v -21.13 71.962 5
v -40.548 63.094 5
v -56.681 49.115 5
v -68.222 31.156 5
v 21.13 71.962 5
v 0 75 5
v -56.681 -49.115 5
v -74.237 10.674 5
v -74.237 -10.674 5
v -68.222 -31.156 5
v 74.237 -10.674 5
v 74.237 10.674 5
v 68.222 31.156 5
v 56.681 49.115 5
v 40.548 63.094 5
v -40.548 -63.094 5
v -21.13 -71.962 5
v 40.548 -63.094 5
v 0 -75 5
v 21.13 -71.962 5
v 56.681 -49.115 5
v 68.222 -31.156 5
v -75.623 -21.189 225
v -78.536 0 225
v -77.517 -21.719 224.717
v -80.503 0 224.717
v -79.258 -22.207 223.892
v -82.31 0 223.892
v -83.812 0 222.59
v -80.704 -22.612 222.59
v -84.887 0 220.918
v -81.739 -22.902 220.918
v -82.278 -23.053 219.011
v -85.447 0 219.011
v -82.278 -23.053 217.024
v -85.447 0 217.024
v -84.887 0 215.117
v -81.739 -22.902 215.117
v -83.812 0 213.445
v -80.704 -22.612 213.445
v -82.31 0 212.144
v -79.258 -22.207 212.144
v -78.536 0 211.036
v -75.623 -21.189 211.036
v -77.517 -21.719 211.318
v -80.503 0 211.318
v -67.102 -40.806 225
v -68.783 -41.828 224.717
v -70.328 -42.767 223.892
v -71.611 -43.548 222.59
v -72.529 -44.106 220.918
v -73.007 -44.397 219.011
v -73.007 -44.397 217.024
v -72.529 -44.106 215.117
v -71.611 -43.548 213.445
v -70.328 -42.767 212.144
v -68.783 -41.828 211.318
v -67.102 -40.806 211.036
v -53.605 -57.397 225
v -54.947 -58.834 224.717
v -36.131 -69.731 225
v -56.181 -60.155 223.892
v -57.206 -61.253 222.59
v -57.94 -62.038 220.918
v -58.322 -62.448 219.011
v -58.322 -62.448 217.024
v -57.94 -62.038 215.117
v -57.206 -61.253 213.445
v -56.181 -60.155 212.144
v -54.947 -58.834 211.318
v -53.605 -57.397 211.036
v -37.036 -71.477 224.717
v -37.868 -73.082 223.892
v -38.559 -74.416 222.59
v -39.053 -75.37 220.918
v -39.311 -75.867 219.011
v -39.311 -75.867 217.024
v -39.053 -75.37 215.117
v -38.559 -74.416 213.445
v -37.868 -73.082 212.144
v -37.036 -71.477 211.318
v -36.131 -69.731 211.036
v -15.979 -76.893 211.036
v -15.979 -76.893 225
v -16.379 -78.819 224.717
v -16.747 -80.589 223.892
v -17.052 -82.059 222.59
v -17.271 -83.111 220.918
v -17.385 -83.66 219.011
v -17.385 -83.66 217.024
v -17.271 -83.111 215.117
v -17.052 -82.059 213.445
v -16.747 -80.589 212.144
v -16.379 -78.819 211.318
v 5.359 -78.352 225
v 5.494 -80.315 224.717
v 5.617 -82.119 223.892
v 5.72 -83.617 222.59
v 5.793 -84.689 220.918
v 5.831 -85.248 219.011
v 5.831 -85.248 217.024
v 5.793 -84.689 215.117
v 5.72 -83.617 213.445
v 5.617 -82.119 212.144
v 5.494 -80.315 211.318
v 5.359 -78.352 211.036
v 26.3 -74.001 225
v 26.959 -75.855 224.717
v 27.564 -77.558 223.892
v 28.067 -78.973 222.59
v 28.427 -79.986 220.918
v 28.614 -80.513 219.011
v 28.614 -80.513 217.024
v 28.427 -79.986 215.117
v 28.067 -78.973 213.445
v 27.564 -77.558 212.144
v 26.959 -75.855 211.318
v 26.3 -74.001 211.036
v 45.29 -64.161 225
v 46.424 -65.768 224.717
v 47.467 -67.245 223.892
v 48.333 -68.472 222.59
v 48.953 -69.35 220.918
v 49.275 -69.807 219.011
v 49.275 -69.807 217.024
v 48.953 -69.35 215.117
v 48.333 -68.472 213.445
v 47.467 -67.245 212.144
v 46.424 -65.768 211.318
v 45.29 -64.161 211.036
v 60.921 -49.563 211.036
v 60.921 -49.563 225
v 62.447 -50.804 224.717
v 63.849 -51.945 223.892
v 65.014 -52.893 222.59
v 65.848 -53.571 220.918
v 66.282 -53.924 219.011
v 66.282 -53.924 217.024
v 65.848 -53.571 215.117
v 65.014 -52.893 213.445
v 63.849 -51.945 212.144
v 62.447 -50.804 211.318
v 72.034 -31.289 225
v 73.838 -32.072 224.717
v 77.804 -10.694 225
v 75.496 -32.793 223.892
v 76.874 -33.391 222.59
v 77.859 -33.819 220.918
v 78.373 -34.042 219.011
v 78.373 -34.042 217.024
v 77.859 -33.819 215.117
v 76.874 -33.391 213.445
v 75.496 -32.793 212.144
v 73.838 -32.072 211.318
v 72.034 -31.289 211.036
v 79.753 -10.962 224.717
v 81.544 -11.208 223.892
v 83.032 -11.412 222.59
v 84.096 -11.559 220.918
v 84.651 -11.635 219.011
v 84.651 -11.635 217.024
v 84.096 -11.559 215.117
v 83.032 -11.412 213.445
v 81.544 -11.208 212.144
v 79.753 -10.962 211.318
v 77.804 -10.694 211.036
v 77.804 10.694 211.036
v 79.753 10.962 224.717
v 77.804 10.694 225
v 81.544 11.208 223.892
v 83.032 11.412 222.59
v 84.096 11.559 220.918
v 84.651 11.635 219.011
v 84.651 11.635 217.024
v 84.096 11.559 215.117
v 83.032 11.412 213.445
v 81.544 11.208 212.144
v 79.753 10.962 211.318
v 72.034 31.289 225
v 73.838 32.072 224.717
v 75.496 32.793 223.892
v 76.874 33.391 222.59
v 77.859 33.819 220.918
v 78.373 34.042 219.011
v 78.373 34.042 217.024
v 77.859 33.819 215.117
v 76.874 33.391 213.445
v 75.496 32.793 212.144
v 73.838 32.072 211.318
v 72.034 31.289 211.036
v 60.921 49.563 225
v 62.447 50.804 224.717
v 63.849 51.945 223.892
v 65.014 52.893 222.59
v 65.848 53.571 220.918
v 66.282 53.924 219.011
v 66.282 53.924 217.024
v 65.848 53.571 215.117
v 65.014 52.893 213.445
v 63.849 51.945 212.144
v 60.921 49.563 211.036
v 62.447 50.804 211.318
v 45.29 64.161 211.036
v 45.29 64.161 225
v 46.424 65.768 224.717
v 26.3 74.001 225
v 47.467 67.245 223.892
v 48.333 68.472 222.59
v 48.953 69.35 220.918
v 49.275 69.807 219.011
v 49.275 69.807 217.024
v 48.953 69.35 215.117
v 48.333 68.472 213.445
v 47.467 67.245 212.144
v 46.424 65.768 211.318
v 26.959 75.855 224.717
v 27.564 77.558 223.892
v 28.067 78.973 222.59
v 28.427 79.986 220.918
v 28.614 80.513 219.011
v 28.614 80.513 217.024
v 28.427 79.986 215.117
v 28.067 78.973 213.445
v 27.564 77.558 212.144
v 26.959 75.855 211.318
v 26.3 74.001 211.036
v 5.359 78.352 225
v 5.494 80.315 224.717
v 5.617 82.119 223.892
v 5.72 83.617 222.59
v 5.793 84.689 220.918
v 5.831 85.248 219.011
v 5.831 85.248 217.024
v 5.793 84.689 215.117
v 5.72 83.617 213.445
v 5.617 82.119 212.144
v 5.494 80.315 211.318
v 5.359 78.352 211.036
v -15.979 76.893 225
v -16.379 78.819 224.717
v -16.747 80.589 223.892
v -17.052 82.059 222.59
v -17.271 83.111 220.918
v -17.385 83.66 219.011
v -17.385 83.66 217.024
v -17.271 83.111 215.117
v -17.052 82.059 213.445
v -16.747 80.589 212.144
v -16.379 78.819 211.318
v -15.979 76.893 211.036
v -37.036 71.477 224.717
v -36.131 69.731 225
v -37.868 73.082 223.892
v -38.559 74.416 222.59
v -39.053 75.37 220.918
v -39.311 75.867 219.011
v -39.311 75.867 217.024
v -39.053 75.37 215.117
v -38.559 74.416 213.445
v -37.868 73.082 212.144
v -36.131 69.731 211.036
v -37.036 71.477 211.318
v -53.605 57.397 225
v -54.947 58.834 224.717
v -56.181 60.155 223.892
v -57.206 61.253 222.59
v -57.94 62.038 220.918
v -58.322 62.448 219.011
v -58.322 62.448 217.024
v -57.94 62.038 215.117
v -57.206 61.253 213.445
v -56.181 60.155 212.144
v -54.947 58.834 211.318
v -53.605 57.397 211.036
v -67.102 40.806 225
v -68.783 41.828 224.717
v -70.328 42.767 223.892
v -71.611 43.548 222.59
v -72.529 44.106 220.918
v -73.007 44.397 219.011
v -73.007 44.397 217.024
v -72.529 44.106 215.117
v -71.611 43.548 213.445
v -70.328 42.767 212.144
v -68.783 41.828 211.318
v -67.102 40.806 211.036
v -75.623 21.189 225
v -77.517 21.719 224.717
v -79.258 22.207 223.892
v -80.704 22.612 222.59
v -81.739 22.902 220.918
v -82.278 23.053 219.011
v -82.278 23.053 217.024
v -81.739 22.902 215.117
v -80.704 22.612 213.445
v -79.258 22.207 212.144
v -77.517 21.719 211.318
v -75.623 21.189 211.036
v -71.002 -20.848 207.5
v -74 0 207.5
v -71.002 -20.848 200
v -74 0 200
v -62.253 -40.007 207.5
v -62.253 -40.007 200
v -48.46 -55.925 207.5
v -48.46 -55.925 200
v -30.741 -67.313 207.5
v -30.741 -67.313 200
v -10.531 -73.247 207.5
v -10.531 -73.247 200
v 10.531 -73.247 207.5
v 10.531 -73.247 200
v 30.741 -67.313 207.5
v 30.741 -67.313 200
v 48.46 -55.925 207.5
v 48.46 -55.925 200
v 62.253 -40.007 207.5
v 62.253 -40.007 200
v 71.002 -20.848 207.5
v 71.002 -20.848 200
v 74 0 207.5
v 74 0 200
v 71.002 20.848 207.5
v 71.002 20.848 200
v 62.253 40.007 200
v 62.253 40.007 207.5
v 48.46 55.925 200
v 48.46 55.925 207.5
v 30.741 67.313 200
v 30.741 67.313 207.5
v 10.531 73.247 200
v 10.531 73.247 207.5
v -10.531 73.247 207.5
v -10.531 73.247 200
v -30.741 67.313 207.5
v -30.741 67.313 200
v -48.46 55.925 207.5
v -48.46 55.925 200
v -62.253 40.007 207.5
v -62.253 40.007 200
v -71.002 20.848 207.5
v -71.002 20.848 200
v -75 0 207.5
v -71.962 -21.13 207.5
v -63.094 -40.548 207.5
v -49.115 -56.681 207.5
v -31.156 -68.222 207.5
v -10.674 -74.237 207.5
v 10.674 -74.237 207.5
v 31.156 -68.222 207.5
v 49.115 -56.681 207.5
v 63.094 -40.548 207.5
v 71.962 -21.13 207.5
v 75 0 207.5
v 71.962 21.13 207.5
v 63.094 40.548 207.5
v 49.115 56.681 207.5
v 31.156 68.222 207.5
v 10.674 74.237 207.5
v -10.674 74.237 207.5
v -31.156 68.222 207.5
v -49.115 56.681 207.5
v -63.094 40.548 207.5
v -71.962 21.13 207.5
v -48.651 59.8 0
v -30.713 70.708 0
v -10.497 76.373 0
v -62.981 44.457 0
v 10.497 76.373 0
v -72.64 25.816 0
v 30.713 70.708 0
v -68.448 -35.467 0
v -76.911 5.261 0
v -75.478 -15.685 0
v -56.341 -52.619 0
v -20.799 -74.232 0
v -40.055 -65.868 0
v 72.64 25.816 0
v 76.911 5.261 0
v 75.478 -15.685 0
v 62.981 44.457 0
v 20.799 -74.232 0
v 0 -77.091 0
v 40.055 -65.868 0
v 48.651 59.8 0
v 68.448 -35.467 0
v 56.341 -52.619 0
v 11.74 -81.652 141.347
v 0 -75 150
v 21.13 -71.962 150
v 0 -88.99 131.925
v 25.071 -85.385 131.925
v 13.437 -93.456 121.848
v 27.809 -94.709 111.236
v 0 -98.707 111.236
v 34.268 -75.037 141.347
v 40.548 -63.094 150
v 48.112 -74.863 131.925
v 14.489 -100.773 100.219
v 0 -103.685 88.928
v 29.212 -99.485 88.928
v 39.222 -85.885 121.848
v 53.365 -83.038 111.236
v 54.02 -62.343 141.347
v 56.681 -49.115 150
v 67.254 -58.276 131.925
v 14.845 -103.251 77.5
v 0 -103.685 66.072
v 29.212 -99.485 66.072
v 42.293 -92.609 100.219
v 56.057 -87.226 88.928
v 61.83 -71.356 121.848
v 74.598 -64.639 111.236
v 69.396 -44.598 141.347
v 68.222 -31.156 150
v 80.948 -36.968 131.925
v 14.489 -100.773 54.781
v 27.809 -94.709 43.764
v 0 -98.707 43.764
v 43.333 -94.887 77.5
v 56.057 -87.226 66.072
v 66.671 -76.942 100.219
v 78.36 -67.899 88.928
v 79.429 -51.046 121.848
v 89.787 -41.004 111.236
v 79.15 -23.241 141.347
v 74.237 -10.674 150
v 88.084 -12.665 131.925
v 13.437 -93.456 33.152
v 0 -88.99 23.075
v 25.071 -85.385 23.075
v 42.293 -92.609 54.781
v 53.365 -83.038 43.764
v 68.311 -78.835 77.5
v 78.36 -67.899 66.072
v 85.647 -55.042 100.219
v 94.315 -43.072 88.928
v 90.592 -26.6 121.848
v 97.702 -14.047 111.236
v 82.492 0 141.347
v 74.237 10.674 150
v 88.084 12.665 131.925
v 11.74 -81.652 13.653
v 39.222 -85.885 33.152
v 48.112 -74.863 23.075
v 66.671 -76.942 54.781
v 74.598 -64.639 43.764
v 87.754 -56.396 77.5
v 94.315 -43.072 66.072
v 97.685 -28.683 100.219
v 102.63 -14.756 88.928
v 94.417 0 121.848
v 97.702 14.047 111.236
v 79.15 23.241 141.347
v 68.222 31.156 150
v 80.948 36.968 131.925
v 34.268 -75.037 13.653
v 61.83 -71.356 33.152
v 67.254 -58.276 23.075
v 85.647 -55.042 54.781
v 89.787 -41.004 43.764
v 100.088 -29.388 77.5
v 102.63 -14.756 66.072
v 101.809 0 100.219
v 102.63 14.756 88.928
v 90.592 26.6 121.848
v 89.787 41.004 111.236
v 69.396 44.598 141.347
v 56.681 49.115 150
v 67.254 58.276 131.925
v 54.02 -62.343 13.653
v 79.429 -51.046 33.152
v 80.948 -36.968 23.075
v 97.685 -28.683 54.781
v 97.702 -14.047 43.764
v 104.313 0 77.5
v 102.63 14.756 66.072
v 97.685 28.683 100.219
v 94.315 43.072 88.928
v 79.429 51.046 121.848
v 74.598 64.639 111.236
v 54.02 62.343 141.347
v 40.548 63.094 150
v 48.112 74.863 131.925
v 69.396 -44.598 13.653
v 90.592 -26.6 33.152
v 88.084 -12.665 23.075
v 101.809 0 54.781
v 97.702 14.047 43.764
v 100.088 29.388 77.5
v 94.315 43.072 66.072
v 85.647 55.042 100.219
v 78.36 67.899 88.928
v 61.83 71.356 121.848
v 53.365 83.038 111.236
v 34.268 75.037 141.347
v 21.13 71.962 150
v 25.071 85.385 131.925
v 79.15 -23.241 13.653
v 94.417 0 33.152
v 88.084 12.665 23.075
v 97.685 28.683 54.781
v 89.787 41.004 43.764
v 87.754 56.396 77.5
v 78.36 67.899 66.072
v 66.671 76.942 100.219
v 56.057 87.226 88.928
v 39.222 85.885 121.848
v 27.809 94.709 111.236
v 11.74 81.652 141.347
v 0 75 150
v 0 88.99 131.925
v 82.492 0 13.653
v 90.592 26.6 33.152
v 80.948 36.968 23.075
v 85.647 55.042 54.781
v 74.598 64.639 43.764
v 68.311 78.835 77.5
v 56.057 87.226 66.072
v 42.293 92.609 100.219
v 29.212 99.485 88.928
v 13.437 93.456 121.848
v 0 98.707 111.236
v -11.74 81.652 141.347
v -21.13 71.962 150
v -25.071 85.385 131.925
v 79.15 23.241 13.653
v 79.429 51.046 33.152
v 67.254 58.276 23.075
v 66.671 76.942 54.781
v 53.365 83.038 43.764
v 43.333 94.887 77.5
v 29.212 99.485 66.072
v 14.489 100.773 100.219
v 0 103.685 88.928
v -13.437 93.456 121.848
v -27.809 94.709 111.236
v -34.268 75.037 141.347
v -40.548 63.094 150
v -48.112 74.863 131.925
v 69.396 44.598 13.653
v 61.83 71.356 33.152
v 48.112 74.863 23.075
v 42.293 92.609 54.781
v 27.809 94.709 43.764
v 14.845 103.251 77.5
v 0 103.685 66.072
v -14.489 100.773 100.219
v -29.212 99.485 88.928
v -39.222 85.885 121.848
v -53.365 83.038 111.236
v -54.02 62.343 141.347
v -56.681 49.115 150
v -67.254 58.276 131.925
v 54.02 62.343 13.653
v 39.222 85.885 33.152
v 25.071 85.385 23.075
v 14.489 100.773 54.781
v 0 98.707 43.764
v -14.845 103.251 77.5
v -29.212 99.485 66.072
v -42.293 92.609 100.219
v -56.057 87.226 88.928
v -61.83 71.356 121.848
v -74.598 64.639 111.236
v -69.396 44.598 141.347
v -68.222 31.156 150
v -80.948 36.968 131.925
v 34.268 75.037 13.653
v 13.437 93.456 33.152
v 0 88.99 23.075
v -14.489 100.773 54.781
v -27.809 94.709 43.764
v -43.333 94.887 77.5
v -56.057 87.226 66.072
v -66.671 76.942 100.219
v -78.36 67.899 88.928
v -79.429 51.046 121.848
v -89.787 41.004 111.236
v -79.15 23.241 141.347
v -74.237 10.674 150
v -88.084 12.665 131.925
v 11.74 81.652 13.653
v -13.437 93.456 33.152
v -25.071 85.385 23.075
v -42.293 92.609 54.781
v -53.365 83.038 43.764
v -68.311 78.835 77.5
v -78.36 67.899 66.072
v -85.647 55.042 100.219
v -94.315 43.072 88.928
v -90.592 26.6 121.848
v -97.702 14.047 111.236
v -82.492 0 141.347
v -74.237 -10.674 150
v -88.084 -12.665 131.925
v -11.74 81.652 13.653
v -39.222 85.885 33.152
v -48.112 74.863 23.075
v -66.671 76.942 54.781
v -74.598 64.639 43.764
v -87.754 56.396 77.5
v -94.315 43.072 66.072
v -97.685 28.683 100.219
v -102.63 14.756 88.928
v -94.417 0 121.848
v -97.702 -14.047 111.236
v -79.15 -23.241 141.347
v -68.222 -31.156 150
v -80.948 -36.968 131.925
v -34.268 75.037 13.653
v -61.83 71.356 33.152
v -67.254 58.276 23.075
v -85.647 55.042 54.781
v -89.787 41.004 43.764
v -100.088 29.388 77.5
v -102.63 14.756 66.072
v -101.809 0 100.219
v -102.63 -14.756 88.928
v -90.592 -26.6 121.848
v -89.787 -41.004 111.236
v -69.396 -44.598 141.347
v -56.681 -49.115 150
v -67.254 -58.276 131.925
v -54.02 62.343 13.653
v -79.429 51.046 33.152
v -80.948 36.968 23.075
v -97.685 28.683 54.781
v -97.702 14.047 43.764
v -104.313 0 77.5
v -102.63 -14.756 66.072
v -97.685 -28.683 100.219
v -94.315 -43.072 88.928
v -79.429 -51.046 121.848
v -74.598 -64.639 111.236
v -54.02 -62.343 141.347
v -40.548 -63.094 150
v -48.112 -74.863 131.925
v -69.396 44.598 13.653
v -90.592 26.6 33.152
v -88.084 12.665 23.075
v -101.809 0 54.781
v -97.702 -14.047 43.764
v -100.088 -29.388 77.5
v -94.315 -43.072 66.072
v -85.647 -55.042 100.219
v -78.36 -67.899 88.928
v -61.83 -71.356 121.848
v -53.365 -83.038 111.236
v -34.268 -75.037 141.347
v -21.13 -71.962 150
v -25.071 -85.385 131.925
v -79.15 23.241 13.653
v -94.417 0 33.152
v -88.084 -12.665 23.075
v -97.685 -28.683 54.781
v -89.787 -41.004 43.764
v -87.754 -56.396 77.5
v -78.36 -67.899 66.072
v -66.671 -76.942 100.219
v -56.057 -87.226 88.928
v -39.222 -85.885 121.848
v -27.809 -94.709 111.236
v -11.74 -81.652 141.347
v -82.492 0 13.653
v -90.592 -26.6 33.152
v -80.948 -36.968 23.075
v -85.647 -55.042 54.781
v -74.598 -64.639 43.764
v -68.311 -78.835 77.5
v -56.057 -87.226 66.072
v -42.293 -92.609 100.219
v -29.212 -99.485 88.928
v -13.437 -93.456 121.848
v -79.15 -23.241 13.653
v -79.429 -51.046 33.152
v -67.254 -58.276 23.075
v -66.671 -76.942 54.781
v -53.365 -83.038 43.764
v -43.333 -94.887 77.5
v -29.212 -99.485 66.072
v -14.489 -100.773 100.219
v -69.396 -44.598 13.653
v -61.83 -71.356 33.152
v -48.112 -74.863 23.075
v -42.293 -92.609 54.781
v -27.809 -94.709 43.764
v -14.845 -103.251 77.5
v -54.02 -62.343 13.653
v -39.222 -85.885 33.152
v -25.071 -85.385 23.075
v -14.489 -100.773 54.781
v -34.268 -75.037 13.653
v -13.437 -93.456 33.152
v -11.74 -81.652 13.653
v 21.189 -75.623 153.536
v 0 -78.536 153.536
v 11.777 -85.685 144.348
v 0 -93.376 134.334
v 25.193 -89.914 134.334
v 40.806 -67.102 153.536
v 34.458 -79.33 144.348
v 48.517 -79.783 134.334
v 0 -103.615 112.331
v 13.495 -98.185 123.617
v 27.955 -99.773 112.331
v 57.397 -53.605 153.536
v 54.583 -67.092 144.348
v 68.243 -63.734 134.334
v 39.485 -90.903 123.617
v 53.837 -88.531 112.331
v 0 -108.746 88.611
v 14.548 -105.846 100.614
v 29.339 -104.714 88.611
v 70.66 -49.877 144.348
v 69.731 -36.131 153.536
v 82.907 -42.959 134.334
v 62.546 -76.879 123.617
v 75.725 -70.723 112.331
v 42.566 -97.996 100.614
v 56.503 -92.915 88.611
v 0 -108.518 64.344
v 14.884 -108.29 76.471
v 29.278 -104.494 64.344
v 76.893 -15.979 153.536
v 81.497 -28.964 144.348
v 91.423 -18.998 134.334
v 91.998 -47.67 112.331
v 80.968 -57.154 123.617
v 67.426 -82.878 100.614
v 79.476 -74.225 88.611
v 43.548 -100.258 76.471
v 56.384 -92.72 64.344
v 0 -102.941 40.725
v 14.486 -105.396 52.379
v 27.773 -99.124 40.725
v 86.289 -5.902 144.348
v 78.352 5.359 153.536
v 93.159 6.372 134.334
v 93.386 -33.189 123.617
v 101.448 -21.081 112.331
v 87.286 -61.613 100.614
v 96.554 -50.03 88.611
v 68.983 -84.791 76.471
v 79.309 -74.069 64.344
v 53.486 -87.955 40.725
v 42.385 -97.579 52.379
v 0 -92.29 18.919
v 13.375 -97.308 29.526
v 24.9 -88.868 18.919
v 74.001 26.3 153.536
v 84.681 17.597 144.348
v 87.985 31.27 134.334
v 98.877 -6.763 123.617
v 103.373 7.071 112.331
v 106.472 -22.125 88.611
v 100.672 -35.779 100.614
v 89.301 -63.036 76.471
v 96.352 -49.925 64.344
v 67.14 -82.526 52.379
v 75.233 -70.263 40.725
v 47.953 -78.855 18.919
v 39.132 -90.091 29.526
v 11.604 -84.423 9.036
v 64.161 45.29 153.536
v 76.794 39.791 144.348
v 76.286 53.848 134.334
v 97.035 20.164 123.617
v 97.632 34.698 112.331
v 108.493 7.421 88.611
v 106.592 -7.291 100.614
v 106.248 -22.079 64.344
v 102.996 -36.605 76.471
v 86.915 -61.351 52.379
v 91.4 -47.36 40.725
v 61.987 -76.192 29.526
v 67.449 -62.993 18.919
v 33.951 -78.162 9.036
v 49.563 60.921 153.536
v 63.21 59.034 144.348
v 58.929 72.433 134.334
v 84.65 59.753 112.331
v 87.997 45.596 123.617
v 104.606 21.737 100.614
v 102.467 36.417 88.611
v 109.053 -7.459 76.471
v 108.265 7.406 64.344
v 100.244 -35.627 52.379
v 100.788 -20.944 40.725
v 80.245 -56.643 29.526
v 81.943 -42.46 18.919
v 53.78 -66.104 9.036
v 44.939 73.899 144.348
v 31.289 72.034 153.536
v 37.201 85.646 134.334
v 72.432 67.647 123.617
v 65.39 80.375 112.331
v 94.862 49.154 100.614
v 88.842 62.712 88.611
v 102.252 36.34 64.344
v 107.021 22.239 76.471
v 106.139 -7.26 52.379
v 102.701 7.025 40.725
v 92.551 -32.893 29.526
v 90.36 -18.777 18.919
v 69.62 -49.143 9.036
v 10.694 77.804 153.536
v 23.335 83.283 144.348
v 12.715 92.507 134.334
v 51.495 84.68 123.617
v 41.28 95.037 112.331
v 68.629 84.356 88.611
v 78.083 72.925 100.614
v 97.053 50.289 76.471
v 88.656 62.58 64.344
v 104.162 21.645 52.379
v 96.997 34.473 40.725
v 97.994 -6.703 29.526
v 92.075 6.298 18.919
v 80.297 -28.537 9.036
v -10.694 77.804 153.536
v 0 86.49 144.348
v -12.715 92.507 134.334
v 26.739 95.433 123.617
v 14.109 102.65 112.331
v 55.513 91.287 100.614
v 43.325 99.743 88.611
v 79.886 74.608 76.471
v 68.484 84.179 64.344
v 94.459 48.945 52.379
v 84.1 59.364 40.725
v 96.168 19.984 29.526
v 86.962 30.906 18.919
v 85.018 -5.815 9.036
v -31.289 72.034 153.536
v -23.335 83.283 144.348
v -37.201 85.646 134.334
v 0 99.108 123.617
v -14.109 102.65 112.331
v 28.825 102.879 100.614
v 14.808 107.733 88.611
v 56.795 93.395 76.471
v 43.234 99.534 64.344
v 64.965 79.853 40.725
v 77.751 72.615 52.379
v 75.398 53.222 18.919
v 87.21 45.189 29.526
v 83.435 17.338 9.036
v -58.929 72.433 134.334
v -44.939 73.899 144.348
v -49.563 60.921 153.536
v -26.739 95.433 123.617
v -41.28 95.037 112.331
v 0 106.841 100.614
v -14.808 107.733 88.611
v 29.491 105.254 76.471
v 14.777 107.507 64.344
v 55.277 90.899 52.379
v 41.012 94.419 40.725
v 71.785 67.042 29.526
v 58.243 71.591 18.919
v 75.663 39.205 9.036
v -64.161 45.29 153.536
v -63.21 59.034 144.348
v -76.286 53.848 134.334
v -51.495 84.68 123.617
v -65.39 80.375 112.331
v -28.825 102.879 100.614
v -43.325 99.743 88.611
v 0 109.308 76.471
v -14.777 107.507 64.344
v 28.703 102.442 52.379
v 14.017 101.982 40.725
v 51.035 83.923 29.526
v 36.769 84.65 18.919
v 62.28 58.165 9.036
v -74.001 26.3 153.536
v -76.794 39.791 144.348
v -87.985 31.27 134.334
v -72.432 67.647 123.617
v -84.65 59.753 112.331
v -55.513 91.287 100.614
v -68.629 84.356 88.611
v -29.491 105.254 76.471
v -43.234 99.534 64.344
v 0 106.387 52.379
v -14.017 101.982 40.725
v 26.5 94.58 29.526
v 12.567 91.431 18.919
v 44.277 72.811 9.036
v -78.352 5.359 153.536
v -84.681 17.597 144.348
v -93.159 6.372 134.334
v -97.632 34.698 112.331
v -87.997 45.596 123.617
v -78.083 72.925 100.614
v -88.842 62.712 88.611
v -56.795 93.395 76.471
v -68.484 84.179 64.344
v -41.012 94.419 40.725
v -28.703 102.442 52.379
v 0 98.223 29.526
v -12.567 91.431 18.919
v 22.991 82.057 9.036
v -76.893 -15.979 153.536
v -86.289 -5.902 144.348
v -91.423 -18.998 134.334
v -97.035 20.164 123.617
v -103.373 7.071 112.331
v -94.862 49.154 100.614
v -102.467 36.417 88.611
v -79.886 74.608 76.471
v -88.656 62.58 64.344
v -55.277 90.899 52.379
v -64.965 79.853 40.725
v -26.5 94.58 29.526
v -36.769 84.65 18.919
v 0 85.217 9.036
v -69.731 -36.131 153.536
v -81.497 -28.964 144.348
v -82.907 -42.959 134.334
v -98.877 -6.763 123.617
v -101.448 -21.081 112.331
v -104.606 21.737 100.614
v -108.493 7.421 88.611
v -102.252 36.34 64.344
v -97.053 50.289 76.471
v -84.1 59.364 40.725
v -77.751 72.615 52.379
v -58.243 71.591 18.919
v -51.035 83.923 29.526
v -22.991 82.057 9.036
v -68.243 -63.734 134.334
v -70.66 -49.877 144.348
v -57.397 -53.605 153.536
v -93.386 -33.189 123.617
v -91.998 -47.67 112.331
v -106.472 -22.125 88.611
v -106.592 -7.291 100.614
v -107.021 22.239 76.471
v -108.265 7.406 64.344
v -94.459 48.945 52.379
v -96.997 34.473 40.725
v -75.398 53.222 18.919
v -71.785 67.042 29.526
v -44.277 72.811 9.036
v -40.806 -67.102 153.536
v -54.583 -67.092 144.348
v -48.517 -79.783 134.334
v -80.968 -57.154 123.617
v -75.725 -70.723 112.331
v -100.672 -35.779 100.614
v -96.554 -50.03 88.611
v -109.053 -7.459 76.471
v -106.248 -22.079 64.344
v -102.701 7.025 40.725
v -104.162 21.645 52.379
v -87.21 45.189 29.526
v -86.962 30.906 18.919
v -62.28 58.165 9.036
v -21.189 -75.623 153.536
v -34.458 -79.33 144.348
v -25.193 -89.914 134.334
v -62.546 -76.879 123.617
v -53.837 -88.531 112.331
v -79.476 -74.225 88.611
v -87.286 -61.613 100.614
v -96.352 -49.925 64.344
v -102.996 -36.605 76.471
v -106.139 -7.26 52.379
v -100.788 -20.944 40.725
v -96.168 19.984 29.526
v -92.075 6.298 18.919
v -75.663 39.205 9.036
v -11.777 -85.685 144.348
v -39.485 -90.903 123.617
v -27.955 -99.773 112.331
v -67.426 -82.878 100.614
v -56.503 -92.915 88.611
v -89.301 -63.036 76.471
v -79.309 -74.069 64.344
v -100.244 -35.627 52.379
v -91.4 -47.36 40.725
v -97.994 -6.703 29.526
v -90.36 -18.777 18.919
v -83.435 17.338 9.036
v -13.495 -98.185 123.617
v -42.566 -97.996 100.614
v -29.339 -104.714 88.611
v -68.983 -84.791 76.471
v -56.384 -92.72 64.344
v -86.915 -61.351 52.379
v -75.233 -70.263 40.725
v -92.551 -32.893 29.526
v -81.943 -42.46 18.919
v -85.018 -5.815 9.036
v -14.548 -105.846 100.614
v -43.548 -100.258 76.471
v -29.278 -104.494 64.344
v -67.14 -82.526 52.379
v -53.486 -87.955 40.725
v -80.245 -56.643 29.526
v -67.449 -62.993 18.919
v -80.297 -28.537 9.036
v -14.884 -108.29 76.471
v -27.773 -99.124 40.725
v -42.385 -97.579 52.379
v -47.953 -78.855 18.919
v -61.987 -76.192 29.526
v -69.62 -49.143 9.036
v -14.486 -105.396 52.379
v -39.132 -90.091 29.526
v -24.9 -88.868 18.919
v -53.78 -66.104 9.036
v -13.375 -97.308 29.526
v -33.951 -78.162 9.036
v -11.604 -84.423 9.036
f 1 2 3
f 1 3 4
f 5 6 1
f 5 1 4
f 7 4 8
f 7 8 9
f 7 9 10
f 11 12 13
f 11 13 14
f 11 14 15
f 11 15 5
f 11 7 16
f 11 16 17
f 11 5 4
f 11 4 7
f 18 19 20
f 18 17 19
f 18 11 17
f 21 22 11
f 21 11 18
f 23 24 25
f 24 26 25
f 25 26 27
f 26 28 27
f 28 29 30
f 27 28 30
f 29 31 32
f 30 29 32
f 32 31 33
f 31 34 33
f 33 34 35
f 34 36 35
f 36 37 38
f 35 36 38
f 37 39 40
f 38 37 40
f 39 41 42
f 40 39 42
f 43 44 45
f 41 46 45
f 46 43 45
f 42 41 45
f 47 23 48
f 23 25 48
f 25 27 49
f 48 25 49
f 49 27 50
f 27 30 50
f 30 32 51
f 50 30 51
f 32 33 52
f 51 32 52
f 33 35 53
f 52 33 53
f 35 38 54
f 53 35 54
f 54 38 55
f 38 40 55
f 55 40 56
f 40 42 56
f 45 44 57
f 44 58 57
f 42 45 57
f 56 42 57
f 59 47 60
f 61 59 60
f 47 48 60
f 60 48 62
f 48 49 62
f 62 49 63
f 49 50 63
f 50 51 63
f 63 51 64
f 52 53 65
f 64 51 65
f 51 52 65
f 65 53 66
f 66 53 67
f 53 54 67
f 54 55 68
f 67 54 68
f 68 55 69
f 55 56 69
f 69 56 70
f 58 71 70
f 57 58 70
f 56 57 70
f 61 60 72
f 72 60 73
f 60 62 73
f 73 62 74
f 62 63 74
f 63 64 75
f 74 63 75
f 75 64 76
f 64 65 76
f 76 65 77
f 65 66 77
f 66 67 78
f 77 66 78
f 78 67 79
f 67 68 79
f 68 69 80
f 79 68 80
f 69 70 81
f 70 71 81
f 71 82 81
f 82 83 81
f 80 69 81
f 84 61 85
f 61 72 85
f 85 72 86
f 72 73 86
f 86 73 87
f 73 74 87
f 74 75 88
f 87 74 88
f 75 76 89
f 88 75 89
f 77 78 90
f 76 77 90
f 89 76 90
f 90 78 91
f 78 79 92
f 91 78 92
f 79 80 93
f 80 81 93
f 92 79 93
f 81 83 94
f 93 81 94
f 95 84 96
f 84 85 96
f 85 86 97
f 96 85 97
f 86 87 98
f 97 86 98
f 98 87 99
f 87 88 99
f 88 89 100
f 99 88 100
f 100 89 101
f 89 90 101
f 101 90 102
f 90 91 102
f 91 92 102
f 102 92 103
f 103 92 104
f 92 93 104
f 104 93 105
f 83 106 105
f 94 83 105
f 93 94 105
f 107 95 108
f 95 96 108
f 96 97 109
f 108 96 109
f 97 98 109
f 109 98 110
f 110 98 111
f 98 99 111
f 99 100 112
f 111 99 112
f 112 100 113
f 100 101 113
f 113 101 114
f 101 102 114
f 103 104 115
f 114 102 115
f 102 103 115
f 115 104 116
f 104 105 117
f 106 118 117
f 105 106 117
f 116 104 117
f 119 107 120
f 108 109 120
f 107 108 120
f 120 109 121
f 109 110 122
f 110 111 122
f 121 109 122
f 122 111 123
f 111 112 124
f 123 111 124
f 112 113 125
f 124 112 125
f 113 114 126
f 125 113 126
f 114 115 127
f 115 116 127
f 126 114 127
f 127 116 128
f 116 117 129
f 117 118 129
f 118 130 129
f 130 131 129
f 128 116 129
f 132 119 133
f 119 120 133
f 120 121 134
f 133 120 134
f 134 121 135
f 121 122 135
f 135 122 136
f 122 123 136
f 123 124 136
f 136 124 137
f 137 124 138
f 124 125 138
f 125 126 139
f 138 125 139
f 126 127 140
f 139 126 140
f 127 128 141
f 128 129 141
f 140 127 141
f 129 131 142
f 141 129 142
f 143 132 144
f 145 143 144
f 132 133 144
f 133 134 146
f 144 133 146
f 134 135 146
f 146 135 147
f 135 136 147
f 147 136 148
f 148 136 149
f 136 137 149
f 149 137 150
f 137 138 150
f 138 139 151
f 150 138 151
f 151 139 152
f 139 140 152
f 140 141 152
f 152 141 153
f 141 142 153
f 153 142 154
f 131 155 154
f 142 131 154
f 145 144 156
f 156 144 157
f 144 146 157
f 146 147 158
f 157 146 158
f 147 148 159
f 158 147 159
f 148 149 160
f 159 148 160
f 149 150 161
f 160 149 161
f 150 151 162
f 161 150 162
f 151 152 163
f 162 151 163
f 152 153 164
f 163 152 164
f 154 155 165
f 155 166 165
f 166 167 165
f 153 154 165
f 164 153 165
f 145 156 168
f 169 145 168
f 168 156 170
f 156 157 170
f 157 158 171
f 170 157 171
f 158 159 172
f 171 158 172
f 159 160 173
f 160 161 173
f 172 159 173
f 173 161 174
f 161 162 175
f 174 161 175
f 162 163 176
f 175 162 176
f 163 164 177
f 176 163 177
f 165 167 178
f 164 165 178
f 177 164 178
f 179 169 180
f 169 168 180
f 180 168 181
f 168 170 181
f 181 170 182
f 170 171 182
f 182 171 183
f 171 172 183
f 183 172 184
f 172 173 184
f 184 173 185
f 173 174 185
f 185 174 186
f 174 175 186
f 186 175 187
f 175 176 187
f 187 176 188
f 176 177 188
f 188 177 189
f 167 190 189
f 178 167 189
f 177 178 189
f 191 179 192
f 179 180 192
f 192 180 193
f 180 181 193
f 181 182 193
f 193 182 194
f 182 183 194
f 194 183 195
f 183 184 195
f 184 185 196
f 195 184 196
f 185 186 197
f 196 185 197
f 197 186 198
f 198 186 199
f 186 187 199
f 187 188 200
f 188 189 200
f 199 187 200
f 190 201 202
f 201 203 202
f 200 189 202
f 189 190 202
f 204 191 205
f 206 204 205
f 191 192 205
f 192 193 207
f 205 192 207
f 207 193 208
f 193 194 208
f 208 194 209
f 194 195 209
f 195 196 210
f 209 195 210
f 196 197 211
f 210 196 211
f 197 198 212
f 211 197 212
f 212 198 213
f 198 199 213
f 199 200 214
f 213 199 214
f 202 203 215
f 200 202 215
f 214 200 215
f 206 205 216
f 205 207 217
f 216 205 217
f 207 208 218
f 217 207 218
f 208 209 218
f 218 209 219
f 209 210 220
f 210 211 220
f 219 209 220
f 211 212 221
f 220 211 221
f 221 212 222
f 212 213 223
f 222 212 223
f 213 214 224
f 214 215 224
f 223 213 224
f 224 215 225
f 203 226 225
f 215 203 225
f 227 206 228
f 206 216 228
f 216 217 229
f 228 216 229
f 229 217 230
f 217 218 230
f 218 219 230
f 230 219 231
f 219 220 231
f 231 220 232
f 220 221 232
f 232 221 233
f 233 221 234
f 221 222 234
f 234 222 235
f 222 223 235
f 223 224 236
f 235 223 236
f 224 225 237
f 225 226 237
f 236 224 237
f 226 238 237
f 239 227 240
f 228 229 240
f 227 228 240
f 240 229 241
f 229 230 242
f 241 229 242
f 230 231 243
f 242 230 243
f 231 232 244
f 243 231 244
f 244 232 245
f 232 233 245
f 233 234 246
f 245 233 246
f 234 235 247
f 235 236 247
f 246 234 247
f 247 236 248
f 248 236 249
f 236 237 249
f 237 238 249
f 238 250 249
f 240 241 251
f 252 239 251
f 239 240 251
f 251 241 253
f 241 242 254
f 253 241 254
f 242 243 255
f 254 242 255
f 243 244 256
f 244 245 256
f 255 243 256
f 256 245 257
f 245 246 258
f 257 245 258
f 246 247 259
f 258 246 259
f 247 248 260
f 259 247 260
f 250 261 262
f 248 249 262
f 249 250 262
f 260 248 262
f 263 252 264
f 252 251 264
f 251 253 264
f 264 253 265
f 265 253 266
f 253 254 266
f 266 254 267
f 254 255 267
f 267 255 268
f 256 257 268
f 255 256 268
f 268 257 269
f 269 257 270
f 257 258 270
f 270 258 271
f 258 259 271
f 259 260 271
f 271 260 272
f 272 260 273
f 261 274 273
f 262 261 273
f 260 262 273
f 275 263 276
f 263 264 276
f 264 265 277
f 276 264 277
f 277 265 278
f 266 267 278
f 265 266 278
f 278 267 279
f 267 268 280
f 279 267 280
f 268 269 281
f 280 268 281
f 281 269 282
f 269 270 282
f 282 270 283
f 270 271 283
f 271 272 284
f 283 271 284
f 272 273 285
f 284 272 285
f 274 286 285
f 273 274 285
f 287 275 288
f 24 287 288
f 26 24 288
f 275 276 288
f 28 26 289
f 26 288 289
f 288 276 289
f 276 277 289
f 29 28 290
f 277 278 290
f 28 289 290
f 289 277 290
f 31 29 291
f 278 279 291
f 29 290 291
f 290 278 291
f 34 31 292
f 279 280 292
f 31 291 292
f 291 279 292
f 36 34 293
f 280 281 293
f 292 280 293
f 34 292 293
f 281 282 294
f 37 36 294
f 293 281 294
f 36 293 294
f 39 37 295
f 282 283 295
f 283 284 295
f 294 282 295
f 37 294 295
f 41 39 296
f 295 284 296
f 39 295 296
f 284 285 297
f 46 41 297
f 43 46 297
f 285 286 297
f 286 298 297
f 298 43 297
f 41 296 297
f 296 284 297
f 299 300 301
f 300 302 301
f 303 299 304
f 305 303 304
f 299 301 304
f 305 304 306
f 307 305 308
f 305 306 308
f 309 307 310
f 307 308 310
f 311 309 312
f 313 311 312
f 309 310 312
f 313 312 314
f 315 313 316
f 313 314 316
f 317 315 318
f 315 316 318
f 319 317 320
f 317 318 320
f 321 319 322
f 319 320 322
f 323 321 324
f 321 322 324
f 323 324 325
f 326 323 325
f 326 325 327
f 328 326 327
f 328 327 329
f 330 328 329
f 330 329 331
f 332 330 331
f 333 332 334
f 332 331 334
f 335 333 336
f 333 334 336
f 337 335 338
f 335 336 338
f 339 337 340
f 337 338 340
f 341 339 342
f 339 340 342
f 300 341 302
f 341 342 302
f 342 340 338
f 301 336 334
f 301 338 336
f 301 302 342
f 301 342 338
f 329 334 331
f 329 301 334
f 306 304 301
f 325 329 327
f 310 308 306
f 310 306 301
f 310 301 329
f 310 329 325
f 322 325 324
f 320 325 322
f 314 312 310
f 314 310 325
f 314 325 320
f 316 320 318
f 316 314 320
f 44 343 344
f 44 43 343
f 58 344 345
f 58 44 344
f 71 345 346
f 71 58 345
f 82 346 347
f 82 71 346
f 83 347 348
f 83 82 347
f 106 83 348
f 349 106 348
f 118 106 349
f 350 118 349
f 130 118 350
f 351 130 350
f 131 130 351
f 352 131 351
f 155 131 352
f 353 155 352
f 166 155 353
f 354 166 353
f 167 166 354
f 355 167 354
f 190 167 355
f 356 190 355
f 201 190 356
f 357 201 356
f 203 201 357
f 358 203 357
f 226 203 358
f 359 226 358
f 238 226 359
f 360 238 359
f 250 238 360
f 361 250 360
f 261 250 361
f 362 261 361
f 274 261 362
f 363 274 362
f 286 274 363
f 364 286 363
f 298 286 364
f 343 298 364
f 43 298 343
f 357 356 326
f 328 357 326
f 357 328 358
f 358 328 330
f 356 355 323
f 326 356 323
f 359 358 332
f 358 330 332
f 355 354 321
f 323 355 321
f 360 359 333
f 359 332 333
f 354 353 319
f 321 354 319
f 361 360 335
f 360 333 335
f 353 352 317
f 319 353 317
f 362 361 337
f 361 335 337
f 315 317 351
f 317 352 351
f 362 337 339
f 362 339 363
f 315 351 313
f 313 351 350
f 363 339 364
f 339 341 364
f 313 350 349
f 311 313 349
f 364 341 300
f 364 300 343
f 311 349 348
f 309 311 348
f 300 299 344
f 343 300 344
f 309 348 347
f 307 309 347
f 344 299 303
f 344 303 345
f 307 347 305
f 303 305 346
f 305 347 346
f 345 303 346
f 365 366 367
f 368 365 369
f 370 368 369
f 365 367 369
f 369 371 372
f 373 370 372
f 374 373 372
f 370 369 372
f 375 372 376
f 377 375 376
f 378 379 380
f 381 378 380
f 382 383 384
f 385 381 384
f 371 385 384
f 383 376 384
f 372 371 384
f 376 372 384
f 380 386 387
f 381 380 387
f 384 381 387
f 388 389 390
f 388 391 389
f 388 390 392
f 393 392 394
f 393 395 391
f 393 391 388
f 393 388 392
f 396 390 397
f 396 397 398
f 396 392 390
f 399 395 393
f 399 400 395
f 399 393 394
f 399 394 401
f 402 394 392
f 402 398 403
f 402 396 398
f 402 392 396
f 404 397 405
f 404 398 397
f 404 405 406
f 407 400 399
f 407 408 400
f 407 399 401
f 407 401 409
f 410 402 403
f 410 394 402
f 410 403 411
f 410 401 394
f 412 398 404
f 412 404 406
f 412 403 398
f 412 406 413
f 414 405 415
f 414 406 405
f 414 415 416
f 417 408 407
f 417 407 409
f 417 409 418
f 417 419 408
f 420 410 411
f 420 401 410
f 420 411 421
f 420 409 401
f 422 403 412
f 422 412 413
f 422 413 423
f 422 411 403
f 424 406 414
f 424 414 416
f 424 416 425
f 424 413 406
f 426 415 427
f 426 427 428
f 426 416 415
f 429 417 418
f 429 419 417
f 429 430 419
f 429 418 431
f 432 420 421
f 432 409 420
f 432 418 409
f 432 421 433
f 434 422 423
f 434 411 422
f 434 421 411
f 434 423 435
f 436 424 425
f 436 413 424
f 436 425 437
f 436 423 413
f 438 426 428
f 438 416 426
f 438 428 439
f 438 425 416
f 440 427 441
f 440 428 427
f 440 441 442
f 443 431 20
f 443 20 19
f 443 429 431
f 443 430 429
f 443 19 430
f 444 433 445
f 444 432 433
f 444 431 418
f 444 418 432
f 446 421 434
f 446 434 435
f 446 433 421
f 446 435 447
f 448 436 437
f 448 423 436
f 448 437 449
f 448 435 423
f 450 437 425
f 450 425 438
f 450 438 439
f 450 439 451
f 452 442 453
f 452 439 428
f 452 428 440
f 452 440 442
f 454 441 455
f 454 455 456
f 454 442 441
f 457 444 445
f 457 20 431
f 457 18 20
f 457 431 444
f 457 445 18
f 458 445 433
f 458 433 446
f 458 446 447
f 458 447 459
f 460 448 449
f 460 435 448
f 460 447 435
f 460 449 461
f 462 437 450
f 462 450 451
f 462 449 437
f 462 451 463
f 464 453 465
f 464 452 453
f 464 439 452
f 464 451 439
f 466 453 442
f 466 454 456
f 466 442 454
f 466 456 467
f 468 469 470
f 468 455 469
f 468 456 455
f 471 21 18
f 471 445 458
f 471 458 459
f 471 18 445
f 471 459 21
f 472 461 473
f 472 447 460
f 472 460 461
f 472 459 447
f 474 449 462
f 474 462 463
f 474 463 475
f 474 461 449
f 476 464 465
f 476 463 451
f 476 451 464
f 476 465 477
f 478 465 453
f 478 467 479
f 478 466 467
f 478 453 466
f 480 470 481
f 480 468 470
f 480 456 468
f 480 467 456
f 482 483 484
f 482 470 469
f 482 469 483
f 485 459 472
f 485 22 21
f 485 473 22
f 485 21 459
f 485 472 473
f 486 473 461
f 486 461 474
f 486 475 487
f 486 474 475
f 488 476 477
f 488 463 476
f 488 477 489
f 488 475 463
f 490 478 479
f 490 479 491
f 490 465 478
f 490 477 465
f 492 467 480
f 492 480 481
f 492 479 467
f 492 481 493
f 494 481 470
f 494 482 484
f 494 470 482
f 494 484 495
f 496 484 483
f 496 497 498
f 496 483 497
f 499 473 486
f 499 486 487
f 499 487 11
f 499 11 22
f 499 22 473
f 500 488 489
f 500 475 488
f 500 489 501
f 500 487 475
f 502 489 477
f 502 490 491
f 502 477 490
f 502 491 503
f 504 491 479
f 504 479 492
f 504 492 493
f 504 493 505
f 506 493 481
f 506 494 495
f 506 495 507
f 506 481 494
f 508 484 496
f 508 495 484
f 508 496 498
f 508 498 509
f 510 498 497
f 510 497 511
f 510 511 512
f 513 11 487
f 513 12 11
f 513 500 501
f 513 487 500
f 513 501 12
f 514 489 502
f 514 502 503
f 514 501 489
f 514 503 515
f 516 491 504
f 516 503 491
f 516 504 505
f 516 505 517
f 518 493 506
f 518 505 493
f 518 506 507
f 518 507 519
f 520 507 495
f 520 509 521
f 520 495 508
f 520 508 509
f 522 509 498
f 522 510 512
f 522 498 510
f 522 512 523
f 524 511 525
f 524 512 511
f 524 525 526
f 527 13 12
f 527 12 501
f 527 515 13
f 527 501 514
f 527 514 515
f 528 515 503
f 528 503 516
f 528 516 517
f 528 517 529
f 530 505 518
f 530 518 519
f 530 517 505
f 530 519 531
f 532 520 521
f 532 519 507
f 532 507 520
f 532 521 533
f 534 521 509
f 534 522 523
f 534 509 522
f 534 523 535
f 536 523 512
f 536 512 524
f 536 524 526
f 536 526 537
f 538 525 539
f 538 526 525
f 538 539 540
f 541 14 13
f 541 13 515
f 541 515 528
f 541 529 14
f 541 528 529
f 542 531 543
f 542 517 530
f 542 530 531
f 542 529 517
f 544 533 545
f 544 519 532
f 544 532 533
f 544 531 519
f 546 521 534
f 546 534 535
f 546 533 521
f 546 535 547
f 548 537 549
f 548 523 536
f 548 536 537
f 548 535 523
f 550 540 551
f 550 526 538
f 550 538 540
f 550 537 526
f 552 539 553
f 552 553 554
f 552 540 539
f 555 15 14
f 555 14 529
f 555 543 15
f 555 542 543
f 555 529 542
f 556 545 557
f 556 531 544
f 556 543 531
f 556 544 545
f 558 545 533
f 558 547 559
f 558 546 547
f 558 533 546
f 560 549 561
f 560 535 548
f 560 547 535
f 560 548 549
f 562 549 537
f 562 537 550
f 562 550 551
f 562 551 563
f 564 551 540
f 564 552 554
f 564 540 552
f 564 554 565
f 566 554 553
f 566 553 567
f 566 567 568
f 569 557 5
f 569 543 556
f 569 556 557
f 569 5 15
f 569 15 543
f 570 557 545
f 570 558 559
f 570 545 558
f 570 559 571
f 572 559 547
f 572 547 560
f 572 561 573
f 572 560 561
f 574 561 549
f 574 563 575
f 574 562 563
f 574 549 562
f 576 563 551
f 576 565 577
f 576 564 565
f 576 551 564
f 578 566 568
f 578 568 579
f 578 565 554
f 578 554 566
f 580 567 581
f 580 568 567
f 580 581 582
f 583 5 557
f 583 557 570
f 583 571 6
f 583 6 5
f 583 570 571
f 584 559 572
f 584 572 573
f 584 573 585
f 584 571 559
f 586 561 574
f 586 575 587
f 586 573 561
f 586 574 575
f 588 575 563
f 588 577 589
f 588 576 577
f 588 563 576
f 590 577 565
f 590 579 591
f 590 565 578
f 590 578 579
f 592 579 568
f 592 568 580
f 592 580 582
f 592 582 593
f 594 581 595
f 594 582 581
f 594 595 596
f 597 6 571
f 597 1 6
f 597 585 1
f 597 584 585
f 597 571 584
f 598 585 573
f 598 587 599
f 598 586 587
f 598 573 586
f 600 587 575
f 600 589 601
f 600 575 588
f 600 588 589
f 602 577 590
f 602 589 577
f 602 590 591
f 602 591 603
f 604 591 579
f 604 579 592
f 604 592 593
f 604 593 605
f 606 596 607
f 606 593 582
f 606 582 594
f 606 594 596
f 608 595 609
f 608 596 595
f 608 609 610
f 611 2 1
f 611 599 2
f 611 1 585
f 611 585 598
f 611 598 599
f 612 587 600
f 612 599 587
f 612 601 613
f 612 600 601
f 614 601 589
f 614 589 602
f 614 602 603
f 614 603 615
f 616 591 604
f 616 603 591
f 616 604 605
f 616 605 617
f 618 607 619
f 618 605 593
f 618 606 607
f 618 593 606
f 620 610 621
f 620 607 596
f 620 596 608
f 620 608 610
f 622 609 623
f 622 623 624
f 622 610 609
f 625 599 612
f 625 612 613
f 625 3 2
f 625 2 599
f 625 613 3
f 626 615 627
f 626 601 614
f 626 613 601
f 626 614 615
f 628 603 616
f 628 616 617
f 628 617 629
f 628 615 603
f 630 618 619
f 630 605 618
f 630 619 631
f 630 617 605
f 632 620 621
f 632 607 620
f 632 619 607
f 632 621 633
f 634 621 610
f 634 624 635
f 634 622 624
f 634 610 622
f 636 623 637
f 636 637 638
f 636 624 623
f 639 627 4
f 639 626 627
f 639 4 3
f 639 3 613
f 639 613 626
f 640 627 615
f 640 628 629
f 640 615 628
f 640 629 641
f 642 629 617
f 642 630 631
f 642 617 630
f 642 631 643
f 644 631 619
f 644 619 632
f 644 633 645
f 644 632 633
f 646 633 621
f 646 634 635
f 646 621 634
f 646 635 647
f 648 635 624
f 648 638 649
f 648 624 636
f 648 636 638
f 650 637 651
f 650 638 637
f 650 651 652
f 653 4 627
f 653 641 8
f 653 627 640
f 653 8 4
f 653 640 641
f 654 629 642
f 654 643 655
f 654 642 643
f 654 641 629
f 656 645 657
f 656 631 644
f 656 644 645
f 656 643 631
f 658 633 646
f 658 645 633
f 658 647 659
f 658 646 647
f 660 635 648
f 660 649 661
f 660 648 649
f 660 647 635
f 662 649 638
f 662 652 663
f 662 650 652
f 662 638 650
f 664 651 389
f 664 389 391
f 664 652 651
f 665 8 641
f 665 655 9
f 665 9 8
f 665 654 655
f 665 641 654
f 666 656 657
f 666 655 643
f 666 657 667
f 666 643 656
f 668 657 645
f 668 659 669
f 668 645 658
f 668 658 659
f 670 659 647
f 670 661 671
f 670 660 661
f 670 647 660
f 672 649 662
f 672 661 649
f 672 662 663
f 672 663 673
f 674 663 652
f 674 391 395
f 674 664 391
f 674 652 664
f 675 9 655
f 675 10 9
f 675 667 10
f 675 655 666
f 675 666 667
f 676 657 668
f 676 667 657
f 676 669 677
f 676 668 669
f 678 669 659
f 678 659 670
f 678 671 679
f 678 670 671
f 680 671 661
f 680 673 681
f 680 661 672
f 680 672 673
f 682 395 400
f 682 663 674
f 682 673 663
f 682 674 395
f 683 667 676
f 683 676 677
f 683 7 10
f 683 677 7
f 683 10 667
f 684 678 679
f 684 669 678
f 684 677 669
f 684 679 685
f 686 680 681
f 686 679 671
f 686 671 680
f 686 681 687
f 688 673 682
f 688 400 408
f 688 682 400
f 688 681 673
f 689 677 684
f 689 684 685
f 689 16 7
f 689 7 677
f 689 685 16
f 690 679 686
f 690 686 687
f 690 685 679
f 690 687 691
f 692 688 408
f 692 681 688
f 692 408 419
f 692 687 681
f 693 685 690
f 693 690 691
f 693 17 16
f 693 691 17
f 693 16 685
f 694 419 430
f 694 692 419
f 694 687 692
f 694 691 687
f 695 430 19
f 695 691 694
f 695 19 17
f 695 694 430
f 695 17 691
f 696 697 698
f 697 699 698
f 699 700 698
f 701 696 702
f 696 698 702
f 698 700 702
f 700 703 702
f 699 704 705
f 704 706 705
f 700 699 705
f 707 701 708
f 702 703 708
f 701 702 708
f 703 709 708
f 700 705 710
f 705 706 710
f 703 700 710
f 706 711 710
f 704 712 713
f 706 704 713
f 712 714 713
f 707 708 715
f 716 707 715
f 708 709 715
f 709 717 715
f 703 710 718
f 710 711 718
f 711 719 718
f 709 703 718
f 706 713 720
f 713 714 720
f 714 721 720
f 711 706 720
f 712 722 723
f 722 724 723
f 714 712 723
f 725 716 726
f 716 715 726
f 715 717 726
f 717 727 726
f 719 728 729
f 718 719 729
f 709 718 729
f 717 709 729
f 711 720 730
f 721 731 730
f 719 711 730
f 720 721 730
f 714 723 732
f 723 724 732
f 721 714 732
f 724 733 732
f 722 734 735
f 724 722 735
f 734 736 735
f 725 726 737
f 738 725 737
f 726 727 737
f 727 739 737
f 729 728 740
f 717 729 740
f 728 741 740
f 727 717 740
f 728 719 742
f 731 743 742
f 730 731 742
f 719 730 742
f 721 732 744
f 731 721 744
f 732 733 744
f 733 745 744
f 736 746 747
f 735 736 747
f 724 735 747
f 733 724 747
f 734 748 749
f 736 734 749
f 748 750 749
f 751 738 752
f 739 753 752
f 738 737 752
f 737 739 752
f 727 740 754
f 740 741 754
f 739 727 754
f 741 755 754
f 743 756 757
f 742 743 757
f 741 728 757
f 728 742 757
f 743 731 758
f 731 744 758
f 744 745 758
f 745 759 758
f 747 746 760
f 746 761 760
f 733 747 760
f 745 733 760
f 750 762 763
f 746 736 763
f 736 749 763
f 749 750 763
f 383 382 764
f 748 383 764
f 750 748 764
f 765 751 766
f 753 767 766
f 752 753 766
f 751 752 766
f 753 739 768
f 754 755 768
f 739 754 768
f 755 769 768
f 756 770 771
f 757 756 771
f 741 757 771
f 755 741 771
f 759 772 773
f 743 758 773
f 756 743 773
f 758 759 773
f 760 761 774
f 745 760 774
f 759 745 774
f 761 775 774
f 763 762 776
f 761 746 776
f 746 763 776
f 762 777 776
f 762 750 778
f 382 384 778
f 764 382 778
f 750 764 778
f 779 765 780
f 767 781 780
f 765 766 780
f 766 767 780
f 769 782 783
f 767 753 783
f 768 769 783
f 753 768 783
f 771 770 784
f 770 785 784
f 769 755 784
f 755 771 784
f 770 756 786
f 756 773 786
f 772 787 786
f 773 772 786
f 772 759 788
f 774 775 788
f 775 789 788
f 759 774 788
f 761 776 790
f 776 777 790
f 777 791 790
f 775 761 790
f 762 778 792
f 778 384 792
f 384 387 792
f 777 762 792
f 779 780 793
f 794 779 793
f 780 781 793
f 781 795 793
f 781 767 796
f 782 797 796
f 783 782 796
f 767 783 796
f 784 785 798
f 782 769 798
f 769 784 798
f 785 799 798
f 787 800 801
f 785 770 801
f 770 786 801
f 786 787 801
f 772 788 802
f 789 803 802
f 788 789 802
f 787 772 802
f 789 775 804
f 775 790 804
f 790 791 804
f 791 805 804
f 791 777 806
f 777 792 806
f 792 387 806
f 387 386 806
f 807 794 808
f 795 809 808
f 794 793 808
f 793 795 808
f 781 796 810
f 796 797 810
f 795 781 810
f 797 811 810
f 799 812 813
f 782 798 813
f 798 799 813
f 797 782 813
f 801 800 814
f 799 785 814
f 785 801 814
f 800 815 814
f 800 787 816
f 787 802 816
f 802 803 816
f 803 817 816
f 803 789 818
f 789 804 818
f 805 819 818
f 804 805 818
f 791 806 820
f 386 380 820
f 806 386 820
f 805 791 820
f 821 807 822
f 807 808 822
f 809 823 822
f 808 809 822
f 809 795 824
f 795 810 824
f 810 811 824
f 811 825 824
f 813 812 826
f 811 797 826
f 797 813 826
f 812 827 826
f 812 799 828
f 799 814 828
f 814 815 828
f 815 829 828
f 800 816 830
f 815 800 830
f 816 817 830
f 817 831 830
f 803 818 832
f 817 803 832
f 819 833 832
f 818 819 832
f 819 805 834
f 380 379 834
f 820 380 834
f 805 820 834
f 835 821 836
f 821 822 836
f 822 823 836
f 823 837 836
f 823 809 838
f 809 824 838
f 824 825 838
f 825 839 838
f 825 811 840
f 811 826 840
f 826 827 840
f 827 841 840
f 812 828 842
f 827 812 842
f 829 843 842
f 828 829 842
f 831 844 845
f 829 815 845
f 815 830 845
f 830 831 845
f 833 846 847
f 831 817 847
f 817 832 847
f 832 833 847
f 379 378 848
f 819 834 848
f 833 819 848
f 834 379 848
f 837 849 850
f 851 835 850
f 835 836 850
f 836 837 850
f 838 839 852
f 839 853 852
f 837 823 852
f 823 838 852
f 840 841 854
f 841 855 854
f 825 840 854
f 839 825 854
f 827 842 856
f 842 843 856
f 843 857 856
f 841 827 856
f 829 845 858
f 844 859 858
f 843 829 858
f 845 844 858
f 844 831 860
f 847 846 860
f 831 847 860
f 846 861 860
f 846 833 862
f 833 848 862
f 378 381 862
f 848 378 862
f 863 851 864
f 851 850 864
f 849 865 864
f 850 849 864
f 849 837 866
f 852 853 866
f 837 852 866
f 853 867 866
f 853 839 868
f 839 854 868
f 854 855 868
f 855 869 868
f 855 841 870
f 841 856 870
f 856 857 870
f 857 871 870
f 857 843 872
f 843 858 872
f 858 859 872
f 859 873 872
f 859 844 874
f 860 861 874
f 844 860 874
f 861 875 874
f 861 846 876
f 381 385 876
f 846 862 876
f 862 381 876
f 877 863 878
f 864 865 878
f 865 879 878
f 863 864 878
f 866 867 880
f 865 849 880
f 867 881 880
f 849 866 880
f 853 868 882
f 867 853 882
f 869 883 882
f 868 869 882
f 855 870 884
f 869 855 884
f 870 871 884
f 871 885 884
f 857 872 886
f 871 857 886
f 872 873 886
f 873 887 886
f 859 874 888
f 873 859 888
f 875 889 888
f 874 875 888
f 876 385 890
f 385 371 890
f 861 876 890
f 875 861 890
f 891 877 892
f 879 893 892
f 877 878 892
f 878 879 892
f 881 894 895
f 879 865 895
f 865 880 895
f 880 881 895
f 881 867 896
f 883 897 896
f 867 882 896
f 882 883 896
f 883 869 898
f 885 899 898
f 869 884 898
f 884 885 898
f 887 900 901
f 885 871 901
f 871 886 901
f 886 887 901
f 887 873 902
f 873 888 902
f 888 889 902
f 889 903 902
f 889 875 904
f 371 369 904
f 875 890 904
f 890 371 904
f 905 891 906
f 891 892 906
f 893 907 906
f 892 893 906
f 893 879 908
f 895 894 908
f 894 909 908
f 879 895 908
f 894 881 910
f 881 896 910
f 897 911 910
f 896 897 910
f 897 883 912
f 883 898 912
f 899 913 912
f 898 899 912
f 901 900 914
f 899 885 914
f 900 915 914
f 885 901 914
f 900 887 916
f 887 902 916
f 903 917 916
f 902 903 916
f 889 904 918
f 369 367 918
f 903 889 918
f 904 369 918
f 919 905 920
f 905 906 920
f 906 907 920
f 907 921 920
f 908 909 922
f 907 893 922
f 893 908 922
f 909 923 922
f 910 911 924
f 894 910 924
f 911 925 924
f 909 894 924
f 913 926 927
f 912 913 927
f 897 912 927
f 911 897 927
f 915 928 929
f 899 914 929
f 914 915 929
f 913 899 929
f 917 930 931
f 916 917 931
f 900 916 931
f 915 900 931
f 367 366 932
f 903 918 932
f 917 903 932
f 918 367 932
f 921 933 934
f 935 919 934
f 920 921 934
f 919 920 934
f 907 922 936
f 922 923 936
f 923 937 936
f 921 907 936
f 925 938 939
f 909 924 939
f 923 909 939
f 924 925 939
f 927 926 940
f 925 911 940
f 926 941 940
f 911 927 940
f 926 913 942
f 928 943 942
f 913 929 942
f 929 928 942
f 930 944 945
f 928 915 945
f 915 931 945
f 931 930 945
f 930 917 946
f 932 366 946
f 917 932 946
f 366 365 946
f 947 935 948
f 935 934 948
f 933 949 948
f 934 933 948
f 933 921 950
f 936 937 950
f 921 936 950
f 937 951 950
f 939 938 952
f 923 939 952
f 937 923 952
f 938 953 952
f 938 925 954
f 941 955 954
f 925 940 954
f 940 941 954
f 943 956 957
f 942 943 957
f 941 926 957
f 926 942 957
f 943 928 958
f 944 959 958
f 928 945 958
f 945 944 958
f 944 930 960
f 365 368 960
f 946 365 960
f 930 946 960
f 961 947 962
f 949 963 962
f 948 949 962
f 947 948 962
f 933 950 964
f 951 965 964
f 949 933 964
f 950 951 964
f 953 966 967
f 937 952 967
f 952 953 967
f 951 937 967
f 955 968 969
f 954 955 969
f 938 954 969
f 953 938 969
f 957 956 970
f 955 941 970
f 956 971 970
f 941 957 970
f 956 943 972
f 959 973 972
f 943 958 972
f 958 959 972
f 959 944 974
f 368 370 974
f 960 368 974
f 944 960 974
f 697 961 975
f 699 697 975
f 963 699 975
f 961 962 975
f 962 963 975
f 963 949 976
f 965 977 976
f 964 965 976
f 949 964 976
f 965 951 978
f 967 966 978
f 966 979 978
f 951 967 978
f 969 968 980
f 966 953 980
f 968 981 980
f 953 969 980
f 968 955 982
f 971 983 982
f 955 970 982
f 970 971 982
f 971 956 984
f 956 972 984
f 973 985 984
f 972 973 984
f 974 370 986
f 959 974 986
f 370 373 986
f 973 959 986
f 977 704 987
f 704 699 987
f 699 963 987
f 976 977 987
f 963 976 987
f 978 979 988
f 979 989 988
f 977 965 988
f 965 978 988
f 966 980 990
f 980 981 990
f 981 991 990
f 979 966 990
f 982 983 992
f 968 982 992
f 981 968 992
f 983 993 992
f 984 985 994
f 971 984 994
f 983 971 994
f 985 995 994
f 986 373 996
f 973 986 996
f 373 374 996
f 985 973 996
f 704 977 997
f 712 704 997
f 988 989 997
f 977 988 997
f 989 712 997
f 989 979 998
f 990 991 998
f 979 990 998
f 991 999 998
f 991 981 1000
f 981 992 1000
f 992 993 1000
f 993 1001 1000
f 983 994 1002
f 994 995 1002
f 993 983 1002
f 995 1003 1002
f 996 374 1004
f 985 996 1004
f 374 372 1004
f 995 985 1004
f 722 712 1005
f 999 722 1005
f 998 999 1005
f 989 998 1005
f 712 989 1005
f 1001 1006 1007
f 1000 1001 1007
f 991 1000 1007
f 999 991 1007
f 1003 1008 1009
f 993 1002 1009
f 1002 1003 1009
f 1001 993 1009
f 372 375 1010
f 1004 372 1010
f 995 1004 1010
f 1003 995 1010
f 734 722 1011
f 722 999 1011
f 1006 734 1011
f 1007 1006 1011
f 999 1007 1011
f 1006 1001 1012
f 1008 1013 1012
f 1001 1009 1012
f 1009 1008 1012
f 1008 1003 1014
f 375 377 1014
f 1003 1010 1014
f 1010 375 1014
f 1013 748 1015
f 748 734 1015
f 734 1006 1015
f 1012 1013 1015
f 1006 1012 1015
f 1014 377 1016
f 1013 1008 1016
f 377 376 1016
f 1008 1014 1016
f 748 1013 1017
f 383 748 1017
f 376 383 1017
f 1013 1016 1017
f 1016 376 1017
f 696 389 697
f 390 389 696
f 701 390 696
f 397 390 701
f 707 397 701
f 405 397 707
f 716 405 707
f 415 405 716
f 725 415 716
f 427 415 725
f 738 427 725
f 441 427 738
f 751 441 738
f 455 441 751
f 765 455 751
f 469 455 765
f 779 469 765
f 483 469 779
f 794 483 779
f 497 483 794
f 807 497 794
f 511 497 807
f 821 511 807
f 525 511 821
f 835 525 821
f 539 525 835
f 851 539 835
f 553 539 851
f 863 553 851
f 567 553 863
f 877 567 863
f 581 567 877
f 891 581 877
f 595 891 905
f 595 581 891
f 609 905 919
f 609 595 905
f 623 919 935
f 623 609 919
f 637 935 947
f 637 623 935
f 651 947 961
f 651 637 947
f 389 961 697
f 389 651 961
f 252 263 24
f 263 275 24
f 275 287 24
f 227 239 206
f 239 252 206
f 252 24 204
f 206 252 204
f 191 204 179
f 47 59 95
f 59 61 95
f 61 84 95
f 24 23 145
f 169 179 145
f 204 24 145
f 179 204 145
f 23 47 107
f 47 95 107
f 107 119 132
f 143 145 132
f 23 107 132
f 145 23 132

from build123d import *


with BuildPart() as body:
    # Sketch → Revolution (revolve)
    with BuildSketch(Plane.YZ):
        with BuildLine():
            Line((-77.090742, 0), (0, 0))
            Line((0, 5), (0, 0))
            Line((-75, 5), (0, 5))
            ThreePointArc((-75, 150), (-104.31323, 77.5), (-75, 5))
            Line((-78.535534, 153.535534), (-75, 150))
            ThreePointArc((-78.535534, 153.535534), (-109.307705, 76.471398), (-77.090742, 0))
        make_face()
    revolve(axis=Axis((0, 0, 0), (0, 0, 1)))


with BuildPart() as lid:
    # Sketch001 → Revolution001 (revolve)
    with BuildSketch(Plane.XZ):
        with BuildLine():
            Line((0, 225), (0, 200))
            Line((0, 200), (-74, 200))
            Line((-74, 207.5), (-74, 200))
            Line((-75, 207.5), (-74, 207.5))
            Line((-75, 207.5), (-78.535534, 211.035534))
            ThreePointArc((-78.535534, 225), (-85.517767, 218.017767), (-78.535534, 211.035534))
            Line((0, 225), (-78.535534, 225))
        make_face()
    revolve(axis=Axis((0, 0, 0), (0, 0, 1)))


solid = Compound([body.part, lid.part])
